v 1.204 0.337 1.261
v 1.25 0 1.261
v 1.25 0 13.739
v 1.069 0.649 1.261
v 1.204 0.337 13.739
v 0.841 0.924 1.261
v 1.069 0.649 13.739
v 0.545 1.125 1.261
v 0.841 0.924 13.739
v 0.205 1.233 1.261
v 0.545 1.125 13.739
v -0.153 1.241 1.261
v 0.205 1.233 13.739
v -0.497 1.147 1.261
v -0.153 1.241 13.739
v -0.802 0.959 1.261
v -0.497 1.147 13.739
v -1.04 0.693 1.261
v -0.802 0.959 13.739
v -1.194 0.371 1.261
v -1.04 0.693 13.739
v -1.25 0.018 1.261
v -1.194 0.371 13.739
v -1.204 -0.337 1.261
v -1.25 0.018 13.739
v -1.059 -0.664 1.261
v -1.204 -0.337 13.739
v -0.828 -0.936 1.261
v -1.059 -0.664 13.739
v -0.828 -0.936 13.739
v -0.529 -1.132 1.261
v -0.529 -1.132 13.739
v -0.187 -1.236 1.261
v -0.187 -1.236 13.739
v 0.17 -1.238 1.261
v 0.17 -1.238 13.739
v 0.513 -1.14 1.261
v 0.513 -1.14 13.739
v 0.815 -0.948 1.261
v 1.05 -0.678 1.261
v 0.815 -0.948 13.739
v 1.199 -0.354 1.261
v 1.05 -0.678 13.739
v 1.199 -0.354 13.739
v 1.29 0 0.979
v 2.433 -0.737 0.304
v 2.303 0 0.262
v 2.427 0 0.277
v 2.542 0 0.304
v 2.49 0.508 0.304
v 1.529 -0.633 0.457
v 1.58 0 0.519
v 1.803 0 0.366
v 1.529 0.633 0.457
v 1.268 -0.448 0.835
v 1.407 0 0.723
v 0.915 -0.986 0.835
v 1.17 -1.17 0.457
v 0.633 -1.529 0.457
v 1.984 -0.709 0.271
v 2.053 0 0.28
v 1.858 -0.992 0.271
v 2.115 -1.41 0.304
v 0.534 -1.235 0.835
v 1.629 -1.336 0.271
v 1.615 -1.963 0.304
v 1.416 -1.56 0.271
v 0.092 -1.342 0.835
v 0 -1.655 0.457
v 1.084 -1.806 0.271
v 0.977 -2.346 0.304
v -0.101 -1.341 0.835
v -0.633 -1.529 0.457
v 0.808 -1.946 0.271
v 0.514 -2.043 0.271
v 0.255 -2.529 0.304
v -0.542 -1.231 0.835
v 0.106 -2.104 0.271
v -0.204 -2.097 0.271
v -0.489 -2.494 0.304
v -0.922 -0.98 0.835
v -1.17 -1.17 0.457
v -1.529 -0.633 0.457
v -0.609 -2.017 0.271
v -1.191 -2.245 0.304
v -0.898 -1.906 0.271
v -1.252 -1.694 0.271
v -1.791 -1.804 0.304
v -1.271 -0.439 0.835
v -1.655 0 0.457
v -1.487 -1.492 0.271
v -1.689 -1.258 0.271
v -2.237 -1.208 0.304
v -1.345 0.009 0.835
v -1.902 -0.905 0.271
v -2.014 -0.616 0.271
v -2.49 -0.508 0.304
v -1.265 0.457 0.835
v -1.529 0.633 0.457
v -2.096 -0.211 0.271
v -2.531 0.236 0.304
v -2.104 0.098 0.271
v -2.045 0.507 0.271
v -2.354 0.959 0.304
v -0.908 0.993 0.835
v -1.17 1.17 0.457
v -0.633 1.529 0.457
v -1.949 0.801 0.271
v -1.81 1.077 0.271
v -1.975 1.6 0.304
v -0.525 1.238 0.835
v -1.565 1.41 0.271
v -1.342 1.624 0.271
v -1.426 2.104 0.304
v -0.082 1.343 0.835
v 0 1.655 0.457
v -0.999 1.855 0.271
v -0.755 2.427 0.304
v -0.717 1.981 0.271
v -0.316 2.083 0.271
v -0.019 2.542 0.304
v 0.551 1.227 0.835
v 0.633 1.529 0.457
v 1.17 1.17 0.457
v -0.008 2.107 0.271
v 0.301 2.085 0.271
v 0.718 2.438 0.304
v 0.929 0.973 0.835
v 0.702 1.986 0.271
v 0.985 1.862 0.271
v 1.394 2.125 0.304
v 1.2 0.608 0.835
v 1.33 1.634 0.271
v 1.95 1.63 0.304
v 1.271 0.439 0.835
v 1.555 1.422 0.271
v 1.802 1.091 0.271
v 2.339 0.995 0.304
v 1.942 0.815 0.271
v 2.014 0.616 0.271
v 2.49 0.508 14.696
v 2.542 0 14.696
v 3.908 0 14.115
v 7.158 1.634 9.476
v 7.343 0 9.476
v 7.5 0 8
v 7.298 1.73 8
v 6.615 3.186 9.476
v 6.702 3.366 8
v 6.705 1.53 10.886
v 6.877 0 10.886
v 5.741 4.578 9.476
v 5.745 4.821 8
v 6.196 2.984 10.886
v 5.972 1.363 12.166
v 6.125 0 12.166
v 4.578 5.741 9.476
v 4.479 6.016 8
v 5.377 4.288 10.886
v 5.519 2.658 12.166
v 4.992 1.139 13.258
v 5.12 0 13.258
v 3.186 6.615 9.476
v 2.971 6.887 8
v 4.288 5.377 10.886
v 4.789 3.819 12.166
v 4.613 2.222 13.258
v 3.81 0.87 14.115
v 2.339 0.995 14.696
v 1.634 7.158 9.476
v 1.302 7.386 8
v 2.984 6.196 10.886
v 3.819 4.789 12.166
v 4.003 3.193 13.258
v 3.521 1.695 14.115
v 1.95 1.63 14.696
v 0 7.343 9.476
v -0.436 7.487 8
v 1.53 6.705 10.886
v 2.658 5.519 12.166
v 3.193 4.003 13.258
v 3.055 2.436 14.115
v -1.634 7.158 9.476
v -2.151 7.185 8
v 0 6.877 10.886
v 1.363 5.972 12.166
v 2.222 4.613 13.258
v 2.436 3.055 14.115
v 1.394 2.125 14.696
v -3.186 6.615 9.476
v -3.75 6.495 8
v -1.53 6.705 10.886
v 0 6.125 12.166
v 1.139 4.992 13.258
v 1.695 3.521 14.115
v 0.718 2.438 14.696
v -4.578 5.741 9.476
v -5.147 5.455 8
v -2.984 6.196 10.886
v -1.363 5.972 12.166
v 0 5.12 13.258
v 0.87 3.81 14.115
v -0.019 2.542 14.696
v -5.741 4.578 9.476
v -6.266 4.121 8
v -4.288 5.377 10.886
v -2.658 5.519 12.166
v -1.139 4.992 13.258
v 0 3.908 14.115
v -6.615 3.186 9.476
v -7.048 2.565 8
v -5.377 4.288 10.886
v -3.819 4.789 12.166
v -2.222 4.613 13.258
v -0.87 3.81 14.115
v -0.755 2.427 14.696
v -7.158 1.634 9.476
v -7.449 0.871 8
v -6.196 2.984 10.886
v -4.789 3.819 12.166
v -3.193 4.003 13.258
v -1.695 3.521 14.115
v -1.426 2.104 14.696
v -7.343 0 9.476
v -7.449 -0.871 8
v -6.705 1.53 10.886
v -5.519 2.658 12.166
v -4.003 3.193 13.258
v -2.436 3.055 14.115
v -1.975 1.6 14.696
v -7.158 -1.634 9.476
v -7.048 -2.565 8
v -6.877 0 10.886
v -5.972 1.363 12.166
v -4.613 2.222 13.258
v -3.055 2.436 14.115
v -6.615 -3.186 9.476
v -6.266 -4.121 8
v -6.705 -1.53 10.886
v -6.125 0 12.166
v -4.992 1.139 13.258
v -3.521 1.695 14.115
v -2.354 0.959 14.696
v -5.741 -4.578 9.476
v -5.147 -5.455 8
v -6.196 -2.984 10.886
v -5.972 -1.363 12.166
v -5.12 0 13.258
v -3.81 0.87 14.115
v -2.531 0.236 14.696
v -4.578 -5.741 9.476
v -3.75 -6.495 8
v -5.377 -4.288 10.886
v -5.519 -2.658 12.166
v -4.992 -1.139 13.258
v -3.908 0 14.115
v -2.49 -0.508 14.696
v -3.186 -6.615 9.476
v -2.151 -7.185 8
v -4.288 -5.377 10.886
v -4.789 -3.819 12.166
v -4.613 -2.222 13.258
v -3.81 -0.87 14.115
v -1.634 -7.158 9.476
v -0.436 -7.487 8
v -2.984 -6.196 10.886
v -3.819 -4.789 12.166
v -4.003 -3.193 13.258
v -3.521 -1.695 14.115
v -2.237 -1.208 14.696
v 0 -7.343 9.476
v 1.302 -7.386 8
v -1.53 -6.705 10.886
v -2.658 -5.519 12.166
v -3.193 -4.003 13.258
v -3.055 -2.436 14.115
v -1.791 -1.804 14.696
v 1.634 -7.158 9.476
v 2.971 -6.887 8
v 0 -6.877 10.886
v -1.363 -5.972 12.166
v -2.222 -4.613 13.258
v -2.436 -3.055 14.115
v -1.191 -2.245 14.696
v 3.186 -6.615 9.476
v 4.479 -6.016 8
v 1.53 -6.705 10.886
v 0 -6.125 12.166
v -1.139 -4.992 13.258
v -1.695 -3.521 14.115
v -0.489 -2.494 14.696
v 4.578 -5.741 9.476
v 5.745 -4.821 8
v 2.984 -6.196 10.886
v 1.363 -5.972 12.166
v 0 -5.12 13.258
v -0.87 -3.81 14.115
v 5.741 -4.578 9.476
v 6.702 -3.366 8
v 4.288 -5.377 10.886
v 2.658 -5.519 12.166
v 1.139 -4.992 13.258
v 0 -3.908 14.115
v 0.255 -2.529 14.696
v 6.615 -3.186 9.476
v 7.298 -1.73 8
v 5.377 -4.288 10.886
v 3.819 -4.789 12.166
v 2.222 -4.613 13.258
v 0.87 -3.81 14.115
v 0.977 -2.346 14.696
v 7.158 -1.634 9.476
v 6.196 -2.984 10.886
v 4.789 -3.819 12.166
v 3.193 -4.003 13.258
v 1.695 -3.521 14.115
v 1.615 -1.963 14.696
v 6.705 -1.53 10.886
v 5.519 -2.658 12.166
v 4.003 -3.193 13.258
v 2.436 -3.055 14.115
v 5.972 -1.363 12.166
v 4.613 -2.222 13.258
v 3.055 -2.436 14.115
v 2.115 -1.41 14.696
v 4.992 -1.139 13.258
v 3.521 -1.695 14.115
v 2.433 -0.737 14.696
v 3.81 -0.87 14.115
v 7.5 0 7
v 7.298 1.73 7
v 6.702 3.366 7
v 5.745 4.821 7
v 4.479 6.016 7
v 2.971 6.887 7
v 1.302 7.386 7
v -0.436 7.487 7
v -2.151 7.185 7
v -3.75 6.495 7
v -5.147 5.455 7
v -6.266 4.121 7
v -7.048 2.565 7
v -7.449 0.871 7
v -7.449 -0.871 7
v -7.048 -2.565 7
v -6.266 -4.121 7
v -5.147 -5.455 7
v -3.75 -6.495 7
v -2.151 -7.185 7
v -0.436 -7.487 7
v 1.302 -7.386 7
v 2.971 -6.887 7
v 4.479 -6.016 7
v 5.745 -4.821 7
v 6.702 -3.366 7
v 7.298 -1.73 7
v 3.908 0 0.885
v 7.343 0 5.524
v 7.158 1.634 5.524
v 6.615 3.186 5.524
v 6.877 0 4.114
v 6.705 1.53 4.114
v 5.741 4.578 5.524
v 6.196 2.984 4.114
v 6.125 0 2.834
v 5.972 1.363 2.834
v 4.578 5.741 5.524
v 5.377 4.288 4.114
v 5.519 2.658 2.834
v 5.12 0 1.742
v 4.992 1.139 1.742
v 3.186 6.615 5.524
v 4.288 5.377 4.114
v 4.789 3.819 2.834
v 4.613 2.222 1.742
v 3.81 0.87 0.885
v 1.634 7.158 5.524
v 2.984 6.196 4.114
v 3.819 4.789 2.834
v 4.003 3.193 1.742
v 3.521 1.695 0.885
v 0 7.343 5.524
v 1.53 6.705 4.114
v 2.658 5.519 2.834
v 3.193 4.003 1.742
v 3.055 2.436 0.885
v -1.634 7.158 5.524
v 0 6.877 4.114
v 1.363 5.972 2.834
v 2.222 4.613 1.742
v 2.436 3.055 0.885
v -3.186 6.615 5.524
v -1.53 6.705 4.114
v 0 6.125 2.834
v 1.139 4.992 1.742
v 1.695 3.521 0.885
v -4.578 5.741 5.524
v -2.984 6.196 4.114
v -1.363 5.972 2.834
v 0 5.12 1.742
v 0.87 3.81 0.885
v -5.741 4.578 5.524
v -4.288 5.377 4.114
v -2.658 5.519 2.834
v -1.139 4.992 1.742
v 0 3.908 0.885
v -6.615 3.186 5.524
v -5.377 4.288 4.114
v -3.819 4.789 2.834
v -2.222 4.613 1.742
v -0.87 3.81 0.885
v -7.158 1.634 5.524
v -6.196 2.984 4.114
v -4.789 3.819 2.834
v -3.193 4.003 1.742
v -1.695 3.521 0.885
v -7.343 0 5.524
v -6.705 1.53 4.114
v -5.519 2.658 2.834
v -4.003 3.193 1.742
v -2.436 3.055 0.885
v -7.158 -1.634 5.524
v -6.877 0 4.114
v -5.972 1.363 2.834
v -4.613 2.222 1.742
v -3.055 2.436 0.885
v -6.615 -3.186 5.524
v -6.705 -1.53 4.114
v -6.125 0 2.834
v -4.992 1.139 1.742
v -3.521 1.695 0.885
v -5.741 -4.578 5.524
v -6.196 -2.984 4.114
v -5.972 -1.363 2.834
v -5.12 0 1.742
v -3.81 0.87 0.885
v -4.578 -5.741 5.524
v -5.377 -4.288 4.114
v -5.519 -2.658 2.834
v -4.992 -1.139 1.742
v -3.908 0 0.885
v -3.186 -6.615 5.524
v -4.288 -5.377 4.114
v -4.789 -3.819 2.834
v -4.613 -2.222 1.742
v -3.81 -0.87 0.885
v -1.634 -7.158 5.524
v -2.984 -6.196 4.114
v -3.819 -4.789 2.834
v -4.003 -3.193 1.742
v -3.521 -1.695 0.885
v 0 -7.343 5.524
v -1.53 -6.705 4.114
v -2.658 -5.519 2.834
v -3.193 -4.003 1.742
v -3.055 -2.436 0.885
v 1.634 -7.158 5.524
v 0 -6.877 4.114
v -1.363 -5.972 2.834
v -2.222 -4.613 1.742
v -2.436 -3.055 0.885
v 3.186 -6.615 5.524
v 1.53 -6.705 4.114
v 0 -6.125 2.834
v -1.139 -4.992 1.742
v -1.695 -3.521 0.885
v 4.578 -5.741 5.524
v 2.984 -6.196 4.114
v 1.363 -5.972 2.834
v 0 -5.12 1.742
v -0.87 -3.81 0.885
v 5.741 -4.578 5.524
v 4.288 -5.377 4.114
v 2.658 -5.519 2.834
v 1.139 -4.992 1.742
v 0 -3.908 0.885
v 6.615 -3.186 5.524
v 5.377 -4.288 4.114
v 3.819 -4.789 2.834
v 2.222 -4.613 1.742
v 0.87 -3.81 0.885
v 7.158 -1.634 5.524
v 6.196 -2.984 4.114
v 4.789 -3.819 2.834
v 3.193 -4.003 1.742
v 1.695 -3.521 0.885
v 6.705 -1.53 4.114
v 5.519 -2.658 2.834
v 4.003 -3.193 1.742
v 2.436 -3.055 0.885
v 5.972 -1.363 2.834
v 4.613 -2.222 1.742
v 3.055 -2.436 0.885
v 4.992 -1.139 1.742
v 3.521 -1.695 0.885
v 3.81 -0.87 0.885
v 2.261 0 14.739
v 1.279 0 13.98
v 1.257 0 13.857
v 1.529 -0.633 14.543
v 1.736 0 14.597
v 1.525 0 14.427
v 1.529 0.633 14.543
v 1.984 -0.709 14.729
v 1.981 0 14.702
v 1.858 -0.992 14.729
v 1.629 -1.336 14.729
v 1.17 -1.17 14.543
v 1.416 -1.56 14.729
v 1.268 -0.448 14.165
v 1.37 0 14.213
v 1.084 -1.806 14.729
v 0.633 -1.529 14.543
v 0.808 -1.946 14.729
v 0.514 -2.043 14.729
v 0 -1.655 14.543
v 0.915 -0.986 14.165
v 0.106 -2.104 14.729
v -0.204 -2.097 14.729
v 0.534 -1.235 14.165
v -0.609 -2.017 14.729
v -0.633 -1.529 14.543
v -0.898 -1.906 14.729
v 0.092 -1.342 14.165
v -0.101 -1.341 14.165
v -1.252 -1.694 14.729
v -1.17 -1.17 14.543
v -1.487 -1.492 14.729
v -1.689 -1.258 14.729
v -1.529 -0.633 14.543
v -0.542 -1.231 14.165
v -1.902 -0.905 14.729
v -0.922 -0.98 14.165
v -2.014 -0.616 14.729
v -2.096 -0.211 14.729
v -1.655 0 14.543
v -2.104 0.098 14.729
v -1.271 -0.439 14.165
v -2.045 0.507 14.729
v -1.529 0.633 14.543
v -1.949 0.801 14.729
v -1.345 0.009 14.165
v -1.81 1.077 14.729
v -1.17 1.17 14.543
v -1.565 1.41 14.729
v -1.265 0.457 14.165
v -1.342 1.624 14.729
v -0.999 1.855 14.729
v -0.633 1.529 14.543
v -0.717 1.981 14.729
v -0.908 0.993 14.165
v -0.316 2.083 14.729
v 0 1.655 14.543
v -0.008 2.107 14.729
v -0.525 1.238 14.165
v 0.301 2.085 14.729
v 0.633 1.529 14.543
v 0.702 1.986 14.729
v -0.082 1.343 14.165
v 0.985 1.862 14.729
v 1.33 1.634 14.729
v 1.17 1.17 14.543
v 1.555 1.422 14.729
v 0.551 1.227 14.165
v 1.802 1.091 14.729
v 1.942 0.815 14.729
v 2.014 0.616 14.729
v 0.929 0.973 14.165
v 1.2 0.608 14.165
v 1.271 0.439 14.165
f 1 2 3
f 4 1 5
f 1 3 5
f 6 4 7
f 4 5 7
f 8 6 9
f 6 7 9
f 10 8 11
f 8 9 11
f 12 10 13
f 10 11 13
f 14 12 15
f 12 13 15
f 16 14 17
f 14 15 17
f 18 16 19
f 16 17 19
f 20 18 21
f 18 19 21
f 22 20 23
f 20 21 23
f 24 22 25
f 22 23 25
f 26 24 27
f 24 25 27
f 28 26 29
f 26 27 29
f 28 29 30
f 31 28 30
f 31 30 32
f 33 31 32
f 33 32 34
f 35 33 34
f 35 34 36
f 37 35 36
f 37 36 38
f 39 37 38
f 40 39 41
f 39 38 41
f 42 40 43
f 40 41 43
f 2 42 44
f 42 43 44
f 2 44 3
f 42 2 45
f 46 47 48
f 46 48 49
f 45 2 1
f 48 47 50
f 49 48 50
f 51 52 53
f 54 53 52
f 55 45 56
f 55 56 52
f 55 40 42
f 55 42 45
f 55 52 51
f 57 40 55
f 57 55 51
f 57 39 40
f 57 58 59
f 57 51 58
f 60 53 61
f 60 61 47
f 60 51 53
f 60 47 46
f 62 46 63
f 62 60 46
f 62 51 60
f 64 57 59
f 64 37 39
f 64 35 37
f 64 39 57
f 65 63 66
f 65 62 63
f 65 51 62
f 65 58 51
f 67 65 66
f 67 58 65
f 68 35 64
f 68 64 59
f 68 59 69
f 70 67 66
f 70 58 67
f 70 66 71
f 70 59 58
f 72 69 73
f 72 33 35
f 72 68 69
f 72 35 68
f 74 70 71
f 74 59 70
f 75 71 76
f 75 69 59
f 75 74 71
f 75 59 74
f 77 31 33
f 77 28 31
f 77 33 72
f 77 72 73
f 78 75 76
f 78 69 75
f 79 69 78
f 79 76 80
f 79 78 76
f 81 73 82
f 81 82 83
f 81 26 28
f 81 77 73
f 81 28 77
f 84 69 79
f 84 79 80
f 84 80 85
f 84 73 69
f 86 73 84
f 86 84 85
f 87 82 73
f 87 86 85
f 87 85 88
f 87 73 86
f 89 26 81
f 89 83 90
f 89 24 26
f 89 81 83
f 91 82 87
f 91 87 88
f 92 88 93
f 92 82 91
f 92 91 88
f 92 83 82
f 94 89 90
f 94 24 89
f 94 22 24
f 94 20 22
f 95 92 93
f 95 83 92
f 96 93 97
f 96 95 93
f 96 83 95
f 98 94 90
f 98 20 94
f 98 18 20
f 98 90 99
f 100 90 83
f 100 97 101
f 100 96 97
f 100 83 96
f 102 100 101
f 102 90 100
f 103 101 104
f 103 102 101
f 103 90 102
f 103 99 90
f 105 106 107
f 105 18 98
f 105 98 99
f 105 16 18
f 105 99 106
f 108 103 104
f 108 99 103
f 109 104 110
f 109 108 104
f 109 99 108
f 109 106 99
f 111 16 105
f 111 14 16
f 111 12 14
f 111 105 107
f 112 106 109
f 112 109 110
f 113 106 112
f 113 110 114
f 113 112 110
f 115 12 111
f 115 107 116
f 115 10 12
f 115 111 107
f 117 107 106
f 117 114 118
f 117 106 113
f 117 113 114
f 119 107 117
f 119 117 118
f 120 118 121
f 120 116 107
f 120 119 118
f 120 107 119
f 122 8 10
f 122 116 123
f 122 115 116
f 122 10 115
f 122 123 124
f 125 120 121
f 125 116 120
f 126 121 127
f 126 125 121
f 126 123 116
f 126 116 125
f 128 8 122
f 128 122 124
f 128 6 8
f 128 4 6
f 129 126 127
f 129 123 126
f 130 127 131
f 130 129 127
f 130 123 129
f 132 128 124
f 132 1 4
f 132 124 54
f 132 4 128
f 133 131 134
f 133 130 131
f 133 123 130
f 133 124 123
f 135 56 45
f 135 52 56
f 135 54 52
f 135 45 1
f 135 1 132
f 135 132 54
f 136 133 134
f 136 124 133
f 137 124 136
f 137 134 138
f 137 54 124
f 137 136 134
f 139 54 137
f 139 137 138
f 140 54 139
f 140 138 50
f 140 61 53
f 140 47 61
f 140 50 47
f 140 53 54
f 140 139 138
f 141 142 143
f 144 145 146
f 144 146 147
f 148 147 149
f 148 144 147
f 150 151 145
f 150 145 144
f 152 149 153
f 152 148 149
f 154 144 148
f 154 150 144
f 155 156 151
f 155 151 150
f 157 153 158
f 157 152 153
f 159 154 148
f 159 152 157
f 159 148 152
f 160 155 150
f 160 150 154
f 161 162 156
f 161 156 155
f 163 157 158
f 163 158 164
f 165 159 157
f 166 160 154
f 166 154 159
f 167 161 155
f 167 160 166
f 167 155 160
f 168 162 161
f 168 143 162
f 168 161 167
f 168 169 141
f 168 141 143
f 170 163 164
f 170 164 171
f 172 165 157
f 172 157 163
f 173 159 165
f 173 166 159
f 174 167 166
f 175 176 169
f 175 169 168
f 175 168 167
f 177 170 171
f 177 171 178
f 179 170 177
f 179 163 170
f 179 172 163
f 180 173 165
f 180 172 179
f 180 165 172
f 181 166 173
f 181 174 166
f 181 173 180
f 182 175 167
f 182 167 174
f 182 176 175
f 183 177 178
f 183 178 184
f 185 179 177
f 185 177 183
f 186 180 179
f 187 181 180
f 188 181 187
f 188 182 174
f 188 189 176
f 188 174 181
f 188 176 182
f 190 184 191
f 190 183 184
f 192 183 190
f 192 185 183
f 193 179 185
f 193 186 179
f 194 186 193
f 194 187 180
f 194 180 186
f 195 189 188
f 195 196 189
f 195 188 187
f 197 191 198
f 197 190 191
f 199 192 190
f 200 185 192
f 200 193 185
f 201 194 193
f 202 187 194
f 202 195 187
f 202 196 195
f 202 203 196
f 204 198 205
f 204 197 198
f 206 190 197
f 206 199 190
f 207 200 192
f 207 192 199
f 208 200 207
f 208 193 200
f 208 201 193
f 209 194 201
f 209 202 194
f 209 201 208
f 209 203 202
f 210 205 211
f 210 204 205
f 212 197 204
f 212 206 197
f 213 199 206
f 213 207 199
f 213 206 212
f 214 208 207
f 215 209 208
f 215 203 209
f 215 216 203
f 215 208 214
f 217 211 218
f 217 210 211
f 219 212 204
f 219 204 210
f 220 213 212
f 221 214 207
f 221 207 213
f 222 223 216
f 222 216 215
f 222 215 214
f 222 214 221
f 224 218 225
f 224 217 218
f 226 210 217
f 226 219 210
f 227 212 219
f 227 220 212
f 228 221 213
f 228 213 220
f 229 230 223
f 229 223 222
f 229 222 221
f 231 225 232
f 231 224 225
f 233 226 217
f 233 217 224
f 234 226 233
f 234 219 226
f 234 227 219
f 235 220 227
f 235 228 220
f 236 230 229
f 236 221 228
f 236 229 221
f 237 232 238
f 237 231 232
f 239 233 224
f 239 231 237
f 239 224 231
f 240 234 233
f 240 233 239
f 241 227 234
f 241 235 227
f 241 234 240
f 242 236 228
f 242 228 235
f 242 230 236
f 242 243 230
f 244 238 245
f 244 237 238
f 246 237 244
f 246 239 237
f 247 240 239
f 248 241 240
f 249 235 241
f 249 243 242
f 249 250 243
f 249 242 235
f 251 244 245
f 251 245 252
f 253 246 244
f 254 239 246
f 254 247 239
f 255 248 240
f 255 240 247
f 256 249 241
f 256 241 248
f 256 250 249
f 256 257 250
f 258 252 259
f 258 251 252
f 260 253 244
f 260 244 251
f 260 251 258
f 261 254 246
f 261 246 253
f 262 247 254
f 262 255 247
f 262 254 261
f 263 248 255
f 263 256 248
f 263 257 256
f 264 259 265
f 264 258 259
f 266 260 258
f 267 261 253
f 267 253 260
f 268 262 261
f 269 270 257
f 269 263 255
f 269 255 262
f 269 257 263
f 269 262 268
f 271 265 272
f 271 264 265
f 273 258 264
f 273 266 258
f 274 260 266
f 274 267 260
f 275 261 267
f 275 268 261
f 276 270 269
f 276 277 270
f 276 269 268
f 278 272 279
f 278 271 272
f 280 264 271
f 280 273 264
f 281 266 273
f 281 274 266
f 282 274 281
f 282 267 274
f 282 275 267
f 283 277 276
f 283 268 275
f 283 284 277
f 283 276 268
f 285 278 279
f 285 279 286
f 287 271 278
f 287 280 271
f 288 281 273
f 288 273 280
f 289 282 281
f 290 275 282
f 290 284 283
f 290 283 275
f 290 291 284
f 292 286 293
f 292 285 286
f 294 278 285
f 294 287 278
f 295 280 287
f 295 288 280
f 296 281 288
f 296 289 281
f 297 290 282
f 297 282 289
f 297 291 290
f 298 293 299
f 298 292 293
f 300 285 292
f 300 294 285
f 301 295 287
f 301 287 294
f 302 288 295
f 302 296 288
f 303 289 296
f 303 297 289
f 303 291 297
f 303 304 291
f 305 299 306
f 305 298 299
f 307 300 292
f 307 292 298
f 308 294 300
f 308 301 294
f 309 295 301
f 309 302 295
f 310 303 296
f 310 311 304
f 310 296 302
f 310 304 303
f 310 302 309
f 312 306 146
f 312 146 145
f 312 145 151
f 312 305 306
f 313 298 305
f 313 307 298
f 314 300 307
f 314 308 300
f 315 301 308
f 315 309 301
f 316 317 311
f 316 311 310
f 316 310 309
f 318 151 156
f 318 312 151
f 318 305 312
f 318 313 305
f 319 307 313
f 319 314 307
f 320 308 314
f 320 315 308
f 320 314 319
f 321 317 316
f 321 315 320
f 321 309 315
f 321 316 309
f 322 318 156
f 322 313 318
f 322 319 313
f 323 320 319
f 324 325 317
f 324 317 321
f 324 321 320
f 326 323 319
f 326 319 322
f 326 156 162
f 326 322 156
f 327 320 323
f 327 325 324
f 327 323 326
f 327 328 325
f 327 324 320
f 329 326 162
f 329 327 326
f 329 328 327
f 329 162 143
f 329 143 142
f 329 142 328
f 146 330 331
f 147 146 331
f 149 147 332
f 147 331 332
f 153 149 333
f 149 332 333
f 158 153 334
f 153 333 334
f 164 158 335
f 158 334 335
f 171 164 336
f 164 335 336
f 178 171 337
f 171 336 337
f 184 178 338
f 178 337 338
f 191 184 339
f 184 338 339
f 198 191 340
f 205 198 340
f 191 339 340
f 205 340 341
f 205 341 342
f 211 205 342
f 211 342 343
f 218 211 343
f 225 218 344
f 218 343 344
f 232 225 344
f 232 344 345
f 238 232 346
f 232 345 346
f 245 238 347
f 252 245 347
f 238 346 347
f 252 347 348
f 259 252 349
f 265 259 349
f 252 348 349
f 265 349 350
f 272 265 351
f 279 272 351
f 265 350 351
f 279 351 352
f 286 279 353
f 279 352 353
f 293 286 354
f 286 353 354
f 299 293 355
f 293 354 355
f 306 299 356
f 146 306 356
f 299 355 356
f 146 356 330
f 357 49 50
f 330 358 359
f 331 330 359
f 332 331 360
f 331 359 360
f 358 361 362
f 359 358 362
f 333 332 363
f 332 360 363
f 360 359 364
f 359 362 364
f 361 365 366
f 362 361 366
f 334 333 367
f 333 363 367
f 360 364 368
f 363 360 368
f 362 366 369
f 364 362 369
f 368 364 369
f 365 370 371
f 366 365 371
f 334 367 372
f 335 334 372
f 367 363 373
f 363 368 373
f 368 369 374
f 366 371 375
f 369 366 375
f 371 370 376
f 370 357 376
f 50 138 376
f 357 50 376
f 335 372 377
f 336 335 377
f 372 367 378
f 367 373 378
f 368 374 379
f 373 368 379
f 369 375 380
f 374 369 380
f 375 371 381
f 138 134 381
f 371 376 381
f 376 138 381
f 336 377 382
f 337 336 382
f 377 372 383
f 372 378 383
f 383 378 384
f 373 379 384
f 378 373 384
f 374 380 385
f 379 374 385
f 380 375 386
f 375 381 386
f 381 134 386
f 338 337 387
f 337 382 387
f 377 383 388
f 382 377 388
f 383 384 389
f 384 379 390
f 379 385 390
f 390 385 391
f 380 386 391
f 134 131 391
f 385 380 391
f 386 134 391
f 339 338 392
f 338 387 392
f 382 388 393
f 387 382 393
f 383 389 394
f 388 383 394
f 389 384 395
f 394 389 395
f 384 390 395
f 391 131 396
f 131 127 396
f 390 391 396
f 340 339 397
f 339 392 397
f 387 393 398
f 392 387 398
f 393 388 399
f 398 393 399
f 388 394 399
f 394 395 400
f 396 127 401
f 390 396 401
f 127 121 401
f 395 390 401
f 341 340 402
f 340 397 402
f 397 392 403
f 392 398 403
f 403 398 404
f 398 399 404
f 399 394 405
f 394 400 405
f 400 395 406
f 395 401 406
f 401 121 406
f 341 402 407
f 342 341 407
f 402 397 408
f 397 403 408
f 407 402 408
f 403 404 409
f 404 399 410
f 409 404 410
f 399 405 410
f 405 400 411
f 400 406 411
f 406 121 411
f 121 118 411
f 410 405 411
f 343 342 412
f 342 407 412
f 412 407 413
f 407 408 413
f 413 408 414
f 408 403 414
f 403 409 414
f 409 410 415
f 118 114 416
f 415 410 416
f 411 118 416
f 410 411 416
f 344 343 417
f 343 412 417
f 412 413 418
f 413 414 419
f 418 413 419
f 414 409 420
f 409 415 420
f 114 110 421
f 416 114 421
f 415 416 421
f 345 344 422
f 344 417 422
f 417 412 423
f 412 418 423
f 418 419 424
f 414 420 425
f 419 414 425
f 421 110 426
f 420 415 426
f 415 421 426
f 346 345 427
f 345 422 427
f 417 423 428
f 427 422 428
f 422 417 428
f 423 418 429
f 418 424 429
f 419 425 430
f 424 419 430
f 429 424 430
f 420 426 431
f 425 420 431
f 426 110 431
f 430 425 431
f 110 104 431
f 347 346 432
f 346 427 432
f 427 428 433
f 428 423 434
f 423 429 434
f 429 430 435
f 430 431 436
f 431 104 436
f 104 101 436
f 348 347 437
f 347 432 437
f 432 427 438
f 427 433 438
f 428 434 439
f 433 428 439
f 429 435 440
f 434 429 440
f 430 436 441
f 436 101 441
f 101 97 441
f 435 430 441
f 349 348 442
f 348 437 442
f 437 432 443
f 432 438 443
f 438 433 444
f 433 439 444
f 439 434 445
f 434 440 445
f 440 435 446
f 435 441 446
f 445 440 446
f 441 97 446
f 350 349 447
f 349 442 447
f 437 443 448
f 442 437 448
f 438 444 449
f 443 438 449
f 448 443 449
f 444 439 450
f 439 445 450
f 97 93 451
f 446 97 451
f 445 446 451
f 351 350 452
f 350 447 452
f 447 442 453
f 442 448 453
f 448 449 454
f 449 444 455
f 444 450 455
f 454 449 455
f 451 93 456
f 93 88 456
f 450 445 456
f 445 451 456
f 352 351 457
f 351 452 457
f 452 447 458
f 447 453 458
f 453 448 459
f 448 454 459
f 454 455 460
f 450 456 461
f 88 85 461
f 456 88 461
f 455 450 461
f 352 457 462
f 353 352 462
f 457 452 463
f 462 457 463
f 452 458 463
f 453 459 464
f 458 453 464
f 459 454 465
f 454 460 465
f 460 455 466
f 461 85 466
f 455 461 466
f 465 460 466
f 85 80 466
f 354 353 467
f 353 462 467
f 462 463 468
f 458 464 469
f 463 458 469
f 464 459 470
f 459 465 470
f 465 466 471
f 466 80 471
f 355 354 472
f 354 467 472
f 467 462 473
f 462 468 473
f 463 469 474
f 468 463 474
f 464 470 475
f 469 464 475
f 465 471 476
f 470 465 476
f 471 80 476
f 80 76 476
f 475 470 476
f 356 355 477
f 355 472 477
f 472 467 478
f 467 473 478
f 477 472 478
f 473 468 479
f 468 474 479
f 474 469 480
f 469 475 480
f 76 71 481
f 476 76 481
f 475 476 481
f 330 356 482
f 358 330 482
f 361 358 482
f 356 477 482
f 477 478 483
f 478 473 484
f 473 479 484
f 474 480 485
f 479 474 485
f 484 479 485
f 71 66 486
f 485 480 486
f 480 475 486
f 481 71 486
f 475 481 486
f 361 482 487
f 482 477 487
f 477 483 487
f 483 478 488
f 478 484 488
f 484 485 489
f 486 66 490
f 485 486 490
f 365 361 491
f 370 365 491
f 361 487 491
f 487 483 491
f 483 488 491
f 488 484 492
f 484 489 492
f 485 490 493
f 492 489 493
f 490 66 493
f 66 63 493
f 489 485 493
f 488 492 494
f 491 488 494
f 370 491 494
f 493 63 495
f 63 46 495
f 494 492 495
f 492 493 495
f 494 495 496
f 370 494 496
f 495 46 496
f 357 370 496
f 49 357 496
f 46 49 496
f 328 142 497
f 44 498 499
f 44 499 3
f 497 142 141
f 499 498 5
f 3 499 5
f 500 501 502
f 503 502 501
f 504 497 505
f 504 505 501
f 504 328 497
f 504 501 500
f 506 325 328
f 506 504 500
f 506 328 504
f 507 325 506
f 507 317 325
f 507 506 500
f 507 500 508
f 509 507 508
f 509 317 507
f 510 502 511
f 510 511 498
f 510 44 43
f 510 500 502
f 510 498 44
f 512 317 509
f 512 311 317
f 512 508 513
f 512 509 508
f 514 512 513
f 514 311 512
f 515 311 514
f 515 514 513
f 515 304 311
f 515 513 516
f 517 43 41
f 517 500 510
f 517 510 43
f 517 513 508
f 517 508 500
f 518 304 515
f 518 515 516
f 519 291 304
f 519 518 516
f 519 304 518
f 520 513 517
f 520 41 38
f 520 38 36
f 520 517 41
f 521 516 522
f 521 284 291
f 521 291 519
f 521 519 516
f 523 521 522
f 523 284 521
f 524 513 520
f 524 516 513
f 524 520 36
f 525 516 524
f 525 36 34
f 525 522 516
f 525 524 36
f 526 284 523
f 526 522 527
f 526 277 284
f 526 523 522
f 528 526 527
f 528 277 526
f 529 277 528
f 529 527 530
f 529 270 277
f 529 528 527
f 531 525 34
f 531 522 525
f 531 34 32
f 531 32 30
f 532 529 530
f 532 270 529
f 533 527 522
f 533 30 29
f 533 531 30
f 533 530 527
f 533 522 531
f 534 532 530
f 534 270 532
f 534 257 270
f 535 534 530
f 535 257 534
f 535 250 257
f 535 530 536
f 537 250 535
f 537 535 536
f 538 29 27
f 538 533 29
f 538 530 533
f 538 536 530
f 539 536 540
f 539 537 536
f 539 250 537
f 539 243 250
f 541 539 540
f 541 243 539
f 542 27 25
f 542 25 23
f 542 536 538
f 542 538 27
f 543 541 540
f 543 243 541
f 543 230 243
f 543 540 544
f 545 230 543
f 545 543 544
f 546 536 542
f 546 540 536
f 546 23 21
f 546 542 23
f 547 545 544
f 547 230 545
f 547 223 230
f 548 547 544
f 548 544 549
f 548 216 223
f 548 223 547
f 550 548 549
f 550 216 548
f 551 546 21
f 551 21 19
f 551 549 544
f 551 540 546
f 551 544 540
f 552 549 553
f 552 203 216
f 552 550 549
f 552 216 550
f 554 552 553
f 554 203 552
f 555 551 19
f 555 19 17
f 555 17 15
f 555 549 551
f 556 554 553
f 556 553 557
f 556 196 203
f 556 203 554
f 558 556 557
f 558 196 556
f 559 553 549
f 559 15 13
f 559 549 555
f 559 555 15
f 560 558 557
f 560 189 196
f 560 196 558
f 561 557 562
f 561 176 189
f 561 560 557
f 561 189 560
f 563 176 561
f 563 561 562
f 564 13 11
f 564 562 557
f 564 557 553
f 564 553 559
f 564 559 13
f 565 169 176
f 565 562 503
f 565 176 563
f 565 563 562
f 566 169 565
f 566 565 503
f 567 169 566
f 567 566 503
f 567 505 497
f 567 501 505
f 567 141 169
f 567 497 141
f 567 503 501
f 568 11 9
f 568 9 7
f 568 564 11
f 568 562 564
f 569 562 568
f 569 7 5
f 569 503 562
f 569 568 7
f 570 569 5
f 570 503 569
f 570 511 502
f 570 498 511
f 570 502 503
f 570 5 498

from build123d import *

# Parameters (mm, degrees)
F0_R     = 7.5
F1_DEPTH = 15
F2_R     = 7
F3_R     = 7
F4_R     = 1.25
F4_R_2   = 0.5
F5_DEPTH = 25
F6_R     = 1
F7_R     = 1


with BuildPart() as f1:
    # F0 (on Top) → F1 (new body)
    with BuildSketch(Plane.XY):
        Circle(F0_R)
    extrude(amount=F1_DEPTH)

    # F2
    f2_edges = [f1.edges().sort_by_distance(p)[0] for p in [
        (-7.5, 0, 15),
    ]]
    fillet(f2_edges, radius=F2_R)

    # F3
    f3_edges = [f1.edges().sort_by_distance(p)[0] for p in [
        (-7.5, 0, 0),
    ]]
    fillet(f3_edges, radius=F3_R)

    # F4 (on face) → F5 (cut)
    with BuildSketch(Plane.XY.offset(15)):
        Circle(F4_R)
        Circle(F4_R_2, mode=Mode.SUBTRACT)
        Circle(F4_R_2)
    extrude(amount=-F5_DEPTH, mode=Mode.SUBTRACT)

    # F6
    f6_edges = [f1.edges().sort_by_distance(p)[0] for p in [
        (-1.25, 0, 14.959705),
    ]]
    fillet(f6_edges, radius=F6_R)

    # F7
    f7_edges = [f1.edges().sort_by_distance(p)[0] for p in [
        (-1.25, 0, 0.040295),
    ]]
    fillet(f7_edges, radius=F7_R)


solid = f1.part
